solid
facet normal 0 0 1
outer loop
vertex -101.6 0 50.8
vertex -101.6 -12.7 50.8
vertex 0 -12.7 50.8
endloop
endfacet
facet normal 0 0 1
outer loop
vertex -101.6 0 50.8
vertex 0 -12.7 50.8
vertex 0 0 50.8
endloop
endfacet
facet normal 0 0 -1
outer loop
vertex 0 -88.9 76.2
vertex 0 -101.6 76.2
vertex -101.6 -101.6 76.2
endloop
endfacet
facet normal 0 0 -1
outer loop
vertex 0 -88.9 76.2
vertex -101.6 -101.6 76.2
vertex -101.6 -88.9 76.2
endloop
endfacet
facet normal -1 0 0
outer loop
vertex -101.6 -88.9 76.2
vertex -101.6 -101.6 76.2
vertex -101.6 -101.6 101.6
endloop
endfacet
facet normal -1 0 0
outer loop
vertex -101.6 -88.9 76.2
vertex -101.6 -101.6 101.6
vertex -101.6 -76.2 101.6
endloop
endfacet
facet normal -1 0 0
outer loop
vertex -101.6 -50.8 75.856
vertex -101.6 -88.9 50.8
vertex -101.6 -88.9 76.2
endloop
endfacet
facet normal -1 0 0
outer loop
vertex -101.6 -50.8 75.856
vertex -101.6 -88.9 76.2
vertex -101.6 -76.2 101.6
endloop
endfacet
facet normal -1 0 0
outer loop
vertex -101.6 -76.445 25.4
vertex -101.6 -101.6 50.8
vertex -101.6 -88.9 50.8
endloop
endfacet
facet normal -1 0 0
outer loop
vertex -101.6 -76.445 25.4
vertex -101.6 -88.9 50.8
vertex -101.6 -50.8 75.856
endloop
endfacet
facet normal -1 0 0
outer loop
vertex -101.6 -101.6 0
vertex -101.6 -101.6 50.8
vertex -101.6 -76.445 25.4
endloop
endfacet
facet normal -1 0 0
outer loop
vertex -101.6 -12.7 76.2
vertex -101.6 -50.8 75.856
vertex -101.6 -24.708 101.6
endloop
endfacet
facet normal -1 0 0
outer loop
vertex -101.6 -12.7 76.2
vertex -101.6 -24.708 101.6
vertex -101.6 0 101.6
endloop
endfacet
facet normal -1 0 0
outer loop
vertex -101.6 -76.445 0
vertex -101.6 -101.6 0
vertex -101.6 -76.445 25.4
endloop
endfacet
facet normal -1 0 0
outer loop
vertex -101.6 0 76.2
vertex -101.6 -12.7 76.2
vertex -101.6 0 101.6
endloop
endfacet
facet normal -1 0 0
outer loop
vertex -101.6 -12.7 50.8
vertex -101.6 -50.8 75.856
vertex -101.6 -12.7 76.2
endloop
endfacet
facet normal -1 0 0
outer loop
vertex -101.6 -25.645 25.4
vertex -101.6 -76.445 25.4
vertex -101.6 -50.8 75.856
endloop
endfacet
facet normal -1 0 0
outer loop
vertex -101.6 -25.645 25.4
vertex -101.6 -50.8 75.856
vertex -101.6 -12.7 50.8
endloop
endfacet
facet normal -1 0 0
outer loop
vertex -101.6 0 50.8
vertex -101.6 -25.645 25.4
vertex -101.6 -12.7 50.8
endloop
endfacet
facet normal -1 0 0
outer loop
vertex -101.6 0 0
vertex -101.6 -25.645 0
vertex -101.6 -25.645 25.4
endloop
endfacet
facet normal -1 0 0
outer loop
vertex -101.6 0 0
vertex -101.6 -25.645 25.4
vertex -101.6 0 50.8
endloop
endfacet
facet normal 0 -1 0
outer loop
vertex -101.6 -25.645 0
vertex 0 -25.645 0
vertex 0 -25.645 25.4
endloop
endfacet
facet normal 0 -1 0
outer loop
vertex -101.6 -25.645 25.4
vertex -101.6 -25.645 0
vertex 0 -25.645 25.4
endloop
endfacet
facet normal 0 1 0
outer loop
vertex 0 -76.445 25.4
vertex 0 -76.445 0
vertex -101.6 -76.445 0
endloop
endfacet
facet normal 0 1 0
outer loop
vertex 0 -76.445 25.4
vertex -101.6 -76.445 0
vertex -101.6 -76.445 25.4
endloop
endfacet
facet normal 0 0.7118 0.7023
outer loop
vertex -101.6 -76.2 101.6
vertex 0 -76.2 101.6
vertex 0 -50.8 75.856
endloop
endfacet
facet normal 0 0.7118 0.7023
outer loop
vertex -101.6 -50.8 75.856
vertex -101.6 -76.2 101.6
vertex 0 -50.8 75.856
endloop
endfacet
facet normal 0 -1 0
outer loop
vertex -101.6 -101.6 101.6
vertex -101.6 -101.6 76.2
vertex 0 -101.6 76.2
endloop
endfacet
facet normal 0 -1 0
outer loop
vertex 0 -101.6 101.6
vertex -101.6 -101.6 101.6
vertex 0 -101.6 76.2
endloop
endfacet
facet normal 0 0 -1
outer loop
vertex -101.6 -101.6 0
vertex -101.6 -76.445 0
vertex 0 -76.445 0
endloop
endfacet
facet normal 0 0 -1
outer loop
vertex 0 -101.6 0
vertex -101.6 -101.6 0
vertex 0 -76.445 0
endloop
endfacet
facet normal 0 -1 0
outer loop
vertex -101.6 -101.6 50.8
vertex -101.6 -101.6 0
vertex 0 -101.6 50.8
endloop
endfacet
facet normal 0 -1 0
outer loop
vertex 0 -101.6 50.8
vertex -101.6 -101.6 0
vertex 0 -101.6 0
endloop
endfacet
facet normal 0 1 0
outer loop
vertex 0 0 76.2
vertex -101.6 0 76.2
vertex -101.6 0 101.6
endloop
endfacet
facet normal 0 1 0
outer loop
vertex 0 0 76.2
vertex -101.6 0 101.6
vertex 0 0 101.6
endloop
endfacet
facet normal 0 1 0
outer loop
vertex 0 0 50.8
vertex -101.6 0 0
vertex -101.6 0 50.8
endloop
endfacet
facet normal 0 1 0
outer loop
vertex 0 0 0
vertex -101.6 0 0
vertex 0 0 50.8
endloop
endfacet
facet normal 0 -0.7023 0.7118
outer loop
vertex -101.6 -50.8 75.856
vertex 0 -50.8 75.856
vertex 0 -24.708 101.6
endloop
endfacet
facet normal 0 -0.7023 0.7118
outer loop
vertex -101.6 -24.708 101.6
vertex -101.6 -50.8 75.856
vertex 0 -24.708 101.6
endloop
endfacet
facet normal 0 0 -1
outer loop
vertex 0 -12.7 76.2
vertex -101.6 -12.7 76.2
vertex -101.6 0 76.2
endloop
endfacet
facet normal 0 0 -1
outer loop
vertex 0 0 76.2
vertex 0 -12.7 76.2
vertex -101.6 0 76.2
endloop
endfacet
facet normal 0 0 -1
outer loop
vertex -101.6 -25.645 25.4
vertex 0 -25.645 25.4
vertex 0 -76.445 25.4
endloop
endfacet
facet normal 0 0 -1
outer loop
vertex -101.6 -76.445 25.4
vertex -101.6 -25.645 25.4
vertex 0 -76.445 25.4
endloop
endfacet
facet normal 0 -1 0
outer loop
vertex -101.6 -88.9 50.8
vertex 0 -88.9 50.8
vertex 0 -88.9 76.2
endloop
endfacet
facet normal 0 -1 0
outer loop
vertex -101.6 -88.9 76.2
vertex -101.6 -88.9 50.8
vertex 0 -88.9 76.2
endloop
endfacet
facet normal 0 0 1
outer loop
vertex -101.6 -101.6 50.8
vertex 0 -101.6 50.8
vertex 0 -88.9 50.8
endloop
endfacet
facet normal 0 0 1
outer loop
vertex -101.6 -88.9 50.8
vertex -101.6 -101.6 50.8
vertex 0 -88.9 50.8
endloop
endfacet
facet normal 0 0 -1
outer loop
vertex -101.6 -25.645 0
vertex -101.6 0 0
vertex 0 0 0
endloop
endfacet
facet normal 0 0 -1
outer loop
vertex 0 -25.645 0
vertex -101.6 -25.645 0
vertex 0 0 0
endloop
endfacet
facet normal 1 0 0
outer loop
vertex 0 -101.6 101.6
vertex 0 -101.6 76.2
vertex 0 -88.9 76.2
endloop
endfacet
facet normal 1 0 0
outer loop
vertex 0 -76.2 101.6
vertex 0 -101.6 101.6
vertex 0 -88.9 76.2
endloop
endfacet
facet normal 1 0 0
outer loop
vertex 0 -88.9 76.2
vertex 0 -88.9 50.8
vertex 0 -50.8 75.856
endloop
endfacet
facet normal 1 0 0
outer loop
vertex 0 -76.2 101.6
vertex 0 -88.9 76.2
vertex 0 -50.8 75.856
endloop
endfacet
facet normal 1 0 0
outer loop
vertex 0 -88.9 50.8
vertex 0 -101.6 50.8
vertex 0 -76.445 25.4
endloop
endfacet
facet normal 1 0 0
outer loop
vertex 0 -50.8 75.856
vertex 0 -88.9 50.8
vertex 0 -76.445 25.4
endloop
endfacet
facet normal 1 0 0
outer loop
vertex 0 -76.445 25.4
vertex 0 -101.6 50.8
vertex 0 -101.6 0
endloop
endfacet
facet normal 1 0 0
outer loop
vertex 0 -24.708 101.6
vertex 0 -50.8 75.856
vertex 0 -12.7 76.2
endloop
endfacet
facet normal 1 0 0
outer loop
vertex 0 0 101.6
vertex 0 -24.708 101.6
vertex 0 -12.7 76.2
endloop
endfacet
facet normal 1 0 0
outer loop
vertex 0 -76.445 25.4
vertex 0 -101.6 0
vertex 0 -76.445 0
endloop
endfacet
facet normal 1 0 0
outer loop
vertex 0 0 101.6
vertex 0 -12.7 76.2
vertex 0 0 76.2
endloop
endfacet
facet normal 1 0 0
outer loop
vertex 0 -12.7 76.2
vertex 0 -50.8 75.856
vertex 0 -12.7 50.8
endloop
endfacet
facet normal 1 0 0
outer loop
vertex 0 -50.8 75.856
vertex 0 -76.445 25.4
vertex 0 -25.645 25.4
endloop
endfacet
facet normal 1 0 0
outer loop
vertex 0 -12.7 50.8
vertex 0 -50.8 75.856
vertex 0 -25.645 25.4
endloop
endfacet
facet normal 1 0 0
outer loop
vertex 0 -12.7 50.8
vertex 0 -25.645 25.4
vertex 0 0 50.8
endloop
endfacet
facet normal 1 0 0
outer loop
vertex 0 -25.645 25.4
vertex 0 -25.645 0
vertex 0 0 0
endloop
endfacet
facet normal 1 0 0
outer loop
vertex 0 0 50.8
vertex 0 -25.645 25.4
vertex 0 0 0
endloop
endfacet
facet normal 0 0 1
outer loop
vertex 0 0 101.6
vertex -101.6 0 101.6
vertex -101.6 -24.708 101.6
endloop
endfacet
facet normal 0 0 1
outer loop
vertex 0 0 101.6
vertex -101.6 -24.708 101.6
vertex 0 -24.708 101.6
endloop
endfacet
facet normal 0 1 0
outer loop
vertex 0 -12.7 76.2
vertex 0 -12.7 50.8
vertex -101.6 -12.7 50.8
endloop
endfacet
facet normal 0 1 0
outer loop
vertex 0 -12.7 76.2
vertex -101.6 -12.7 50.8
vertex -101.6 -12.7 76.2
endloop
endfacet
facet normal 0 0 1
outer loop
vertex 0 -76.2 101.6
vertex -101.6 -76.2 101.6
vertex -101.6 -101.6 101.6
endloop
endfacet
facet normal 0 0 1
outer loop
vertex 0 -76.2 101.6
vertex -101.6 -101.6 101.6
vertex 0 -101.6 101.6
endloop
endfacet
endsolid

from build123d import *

# Parameters (mm, degrees)
F0_W     = 101.6
F0_H     = 101.6
F1_DEPTH = 101.6
F2_W     = 12.7
F2_H     = 25.4
F2_W_2   = 25.644753
F2_W_3   = 25.155247
F3_DEPTH = 101.6


with BuildPart() as f1:
    # F0 (on Top) → F1 (new body)
    with BuildSketch(Plane.XY):
        with Locations((-50.8, -50.8)):
            Rectangle(F0_W, F0_H)
    extrude(amount=F1_DEPTH)

    # F2 (on face) → F3 (cut)
    with BuildSketch(Plane.YZ):
        Polygon((-50.8, 101.6), (-76.2, 101.6), (-50.8, 75.85644), align=None)
        Polygon((-50.8, 101.6), (-50.8, 75.85644), (-24.708233, 101.6), align=None)
        with Locations((-95.25, 63.5)):
            Rectangle(F2_W, F2_H)
        with Locations((-63.622376, 12.7)):
            Rectangle(F2_W_2, F2_H)
        with Locations((-38.222376, 12.7)):
            Rectangle(F2_W_3, F2_H)
        with Locations((-6.35, 63.5)):
            Rectangle(F2_W, F2_H)
    extrude(amount=-F3_DEPTH, mode=Mode.SUBTRACT)


solid = f1.part
